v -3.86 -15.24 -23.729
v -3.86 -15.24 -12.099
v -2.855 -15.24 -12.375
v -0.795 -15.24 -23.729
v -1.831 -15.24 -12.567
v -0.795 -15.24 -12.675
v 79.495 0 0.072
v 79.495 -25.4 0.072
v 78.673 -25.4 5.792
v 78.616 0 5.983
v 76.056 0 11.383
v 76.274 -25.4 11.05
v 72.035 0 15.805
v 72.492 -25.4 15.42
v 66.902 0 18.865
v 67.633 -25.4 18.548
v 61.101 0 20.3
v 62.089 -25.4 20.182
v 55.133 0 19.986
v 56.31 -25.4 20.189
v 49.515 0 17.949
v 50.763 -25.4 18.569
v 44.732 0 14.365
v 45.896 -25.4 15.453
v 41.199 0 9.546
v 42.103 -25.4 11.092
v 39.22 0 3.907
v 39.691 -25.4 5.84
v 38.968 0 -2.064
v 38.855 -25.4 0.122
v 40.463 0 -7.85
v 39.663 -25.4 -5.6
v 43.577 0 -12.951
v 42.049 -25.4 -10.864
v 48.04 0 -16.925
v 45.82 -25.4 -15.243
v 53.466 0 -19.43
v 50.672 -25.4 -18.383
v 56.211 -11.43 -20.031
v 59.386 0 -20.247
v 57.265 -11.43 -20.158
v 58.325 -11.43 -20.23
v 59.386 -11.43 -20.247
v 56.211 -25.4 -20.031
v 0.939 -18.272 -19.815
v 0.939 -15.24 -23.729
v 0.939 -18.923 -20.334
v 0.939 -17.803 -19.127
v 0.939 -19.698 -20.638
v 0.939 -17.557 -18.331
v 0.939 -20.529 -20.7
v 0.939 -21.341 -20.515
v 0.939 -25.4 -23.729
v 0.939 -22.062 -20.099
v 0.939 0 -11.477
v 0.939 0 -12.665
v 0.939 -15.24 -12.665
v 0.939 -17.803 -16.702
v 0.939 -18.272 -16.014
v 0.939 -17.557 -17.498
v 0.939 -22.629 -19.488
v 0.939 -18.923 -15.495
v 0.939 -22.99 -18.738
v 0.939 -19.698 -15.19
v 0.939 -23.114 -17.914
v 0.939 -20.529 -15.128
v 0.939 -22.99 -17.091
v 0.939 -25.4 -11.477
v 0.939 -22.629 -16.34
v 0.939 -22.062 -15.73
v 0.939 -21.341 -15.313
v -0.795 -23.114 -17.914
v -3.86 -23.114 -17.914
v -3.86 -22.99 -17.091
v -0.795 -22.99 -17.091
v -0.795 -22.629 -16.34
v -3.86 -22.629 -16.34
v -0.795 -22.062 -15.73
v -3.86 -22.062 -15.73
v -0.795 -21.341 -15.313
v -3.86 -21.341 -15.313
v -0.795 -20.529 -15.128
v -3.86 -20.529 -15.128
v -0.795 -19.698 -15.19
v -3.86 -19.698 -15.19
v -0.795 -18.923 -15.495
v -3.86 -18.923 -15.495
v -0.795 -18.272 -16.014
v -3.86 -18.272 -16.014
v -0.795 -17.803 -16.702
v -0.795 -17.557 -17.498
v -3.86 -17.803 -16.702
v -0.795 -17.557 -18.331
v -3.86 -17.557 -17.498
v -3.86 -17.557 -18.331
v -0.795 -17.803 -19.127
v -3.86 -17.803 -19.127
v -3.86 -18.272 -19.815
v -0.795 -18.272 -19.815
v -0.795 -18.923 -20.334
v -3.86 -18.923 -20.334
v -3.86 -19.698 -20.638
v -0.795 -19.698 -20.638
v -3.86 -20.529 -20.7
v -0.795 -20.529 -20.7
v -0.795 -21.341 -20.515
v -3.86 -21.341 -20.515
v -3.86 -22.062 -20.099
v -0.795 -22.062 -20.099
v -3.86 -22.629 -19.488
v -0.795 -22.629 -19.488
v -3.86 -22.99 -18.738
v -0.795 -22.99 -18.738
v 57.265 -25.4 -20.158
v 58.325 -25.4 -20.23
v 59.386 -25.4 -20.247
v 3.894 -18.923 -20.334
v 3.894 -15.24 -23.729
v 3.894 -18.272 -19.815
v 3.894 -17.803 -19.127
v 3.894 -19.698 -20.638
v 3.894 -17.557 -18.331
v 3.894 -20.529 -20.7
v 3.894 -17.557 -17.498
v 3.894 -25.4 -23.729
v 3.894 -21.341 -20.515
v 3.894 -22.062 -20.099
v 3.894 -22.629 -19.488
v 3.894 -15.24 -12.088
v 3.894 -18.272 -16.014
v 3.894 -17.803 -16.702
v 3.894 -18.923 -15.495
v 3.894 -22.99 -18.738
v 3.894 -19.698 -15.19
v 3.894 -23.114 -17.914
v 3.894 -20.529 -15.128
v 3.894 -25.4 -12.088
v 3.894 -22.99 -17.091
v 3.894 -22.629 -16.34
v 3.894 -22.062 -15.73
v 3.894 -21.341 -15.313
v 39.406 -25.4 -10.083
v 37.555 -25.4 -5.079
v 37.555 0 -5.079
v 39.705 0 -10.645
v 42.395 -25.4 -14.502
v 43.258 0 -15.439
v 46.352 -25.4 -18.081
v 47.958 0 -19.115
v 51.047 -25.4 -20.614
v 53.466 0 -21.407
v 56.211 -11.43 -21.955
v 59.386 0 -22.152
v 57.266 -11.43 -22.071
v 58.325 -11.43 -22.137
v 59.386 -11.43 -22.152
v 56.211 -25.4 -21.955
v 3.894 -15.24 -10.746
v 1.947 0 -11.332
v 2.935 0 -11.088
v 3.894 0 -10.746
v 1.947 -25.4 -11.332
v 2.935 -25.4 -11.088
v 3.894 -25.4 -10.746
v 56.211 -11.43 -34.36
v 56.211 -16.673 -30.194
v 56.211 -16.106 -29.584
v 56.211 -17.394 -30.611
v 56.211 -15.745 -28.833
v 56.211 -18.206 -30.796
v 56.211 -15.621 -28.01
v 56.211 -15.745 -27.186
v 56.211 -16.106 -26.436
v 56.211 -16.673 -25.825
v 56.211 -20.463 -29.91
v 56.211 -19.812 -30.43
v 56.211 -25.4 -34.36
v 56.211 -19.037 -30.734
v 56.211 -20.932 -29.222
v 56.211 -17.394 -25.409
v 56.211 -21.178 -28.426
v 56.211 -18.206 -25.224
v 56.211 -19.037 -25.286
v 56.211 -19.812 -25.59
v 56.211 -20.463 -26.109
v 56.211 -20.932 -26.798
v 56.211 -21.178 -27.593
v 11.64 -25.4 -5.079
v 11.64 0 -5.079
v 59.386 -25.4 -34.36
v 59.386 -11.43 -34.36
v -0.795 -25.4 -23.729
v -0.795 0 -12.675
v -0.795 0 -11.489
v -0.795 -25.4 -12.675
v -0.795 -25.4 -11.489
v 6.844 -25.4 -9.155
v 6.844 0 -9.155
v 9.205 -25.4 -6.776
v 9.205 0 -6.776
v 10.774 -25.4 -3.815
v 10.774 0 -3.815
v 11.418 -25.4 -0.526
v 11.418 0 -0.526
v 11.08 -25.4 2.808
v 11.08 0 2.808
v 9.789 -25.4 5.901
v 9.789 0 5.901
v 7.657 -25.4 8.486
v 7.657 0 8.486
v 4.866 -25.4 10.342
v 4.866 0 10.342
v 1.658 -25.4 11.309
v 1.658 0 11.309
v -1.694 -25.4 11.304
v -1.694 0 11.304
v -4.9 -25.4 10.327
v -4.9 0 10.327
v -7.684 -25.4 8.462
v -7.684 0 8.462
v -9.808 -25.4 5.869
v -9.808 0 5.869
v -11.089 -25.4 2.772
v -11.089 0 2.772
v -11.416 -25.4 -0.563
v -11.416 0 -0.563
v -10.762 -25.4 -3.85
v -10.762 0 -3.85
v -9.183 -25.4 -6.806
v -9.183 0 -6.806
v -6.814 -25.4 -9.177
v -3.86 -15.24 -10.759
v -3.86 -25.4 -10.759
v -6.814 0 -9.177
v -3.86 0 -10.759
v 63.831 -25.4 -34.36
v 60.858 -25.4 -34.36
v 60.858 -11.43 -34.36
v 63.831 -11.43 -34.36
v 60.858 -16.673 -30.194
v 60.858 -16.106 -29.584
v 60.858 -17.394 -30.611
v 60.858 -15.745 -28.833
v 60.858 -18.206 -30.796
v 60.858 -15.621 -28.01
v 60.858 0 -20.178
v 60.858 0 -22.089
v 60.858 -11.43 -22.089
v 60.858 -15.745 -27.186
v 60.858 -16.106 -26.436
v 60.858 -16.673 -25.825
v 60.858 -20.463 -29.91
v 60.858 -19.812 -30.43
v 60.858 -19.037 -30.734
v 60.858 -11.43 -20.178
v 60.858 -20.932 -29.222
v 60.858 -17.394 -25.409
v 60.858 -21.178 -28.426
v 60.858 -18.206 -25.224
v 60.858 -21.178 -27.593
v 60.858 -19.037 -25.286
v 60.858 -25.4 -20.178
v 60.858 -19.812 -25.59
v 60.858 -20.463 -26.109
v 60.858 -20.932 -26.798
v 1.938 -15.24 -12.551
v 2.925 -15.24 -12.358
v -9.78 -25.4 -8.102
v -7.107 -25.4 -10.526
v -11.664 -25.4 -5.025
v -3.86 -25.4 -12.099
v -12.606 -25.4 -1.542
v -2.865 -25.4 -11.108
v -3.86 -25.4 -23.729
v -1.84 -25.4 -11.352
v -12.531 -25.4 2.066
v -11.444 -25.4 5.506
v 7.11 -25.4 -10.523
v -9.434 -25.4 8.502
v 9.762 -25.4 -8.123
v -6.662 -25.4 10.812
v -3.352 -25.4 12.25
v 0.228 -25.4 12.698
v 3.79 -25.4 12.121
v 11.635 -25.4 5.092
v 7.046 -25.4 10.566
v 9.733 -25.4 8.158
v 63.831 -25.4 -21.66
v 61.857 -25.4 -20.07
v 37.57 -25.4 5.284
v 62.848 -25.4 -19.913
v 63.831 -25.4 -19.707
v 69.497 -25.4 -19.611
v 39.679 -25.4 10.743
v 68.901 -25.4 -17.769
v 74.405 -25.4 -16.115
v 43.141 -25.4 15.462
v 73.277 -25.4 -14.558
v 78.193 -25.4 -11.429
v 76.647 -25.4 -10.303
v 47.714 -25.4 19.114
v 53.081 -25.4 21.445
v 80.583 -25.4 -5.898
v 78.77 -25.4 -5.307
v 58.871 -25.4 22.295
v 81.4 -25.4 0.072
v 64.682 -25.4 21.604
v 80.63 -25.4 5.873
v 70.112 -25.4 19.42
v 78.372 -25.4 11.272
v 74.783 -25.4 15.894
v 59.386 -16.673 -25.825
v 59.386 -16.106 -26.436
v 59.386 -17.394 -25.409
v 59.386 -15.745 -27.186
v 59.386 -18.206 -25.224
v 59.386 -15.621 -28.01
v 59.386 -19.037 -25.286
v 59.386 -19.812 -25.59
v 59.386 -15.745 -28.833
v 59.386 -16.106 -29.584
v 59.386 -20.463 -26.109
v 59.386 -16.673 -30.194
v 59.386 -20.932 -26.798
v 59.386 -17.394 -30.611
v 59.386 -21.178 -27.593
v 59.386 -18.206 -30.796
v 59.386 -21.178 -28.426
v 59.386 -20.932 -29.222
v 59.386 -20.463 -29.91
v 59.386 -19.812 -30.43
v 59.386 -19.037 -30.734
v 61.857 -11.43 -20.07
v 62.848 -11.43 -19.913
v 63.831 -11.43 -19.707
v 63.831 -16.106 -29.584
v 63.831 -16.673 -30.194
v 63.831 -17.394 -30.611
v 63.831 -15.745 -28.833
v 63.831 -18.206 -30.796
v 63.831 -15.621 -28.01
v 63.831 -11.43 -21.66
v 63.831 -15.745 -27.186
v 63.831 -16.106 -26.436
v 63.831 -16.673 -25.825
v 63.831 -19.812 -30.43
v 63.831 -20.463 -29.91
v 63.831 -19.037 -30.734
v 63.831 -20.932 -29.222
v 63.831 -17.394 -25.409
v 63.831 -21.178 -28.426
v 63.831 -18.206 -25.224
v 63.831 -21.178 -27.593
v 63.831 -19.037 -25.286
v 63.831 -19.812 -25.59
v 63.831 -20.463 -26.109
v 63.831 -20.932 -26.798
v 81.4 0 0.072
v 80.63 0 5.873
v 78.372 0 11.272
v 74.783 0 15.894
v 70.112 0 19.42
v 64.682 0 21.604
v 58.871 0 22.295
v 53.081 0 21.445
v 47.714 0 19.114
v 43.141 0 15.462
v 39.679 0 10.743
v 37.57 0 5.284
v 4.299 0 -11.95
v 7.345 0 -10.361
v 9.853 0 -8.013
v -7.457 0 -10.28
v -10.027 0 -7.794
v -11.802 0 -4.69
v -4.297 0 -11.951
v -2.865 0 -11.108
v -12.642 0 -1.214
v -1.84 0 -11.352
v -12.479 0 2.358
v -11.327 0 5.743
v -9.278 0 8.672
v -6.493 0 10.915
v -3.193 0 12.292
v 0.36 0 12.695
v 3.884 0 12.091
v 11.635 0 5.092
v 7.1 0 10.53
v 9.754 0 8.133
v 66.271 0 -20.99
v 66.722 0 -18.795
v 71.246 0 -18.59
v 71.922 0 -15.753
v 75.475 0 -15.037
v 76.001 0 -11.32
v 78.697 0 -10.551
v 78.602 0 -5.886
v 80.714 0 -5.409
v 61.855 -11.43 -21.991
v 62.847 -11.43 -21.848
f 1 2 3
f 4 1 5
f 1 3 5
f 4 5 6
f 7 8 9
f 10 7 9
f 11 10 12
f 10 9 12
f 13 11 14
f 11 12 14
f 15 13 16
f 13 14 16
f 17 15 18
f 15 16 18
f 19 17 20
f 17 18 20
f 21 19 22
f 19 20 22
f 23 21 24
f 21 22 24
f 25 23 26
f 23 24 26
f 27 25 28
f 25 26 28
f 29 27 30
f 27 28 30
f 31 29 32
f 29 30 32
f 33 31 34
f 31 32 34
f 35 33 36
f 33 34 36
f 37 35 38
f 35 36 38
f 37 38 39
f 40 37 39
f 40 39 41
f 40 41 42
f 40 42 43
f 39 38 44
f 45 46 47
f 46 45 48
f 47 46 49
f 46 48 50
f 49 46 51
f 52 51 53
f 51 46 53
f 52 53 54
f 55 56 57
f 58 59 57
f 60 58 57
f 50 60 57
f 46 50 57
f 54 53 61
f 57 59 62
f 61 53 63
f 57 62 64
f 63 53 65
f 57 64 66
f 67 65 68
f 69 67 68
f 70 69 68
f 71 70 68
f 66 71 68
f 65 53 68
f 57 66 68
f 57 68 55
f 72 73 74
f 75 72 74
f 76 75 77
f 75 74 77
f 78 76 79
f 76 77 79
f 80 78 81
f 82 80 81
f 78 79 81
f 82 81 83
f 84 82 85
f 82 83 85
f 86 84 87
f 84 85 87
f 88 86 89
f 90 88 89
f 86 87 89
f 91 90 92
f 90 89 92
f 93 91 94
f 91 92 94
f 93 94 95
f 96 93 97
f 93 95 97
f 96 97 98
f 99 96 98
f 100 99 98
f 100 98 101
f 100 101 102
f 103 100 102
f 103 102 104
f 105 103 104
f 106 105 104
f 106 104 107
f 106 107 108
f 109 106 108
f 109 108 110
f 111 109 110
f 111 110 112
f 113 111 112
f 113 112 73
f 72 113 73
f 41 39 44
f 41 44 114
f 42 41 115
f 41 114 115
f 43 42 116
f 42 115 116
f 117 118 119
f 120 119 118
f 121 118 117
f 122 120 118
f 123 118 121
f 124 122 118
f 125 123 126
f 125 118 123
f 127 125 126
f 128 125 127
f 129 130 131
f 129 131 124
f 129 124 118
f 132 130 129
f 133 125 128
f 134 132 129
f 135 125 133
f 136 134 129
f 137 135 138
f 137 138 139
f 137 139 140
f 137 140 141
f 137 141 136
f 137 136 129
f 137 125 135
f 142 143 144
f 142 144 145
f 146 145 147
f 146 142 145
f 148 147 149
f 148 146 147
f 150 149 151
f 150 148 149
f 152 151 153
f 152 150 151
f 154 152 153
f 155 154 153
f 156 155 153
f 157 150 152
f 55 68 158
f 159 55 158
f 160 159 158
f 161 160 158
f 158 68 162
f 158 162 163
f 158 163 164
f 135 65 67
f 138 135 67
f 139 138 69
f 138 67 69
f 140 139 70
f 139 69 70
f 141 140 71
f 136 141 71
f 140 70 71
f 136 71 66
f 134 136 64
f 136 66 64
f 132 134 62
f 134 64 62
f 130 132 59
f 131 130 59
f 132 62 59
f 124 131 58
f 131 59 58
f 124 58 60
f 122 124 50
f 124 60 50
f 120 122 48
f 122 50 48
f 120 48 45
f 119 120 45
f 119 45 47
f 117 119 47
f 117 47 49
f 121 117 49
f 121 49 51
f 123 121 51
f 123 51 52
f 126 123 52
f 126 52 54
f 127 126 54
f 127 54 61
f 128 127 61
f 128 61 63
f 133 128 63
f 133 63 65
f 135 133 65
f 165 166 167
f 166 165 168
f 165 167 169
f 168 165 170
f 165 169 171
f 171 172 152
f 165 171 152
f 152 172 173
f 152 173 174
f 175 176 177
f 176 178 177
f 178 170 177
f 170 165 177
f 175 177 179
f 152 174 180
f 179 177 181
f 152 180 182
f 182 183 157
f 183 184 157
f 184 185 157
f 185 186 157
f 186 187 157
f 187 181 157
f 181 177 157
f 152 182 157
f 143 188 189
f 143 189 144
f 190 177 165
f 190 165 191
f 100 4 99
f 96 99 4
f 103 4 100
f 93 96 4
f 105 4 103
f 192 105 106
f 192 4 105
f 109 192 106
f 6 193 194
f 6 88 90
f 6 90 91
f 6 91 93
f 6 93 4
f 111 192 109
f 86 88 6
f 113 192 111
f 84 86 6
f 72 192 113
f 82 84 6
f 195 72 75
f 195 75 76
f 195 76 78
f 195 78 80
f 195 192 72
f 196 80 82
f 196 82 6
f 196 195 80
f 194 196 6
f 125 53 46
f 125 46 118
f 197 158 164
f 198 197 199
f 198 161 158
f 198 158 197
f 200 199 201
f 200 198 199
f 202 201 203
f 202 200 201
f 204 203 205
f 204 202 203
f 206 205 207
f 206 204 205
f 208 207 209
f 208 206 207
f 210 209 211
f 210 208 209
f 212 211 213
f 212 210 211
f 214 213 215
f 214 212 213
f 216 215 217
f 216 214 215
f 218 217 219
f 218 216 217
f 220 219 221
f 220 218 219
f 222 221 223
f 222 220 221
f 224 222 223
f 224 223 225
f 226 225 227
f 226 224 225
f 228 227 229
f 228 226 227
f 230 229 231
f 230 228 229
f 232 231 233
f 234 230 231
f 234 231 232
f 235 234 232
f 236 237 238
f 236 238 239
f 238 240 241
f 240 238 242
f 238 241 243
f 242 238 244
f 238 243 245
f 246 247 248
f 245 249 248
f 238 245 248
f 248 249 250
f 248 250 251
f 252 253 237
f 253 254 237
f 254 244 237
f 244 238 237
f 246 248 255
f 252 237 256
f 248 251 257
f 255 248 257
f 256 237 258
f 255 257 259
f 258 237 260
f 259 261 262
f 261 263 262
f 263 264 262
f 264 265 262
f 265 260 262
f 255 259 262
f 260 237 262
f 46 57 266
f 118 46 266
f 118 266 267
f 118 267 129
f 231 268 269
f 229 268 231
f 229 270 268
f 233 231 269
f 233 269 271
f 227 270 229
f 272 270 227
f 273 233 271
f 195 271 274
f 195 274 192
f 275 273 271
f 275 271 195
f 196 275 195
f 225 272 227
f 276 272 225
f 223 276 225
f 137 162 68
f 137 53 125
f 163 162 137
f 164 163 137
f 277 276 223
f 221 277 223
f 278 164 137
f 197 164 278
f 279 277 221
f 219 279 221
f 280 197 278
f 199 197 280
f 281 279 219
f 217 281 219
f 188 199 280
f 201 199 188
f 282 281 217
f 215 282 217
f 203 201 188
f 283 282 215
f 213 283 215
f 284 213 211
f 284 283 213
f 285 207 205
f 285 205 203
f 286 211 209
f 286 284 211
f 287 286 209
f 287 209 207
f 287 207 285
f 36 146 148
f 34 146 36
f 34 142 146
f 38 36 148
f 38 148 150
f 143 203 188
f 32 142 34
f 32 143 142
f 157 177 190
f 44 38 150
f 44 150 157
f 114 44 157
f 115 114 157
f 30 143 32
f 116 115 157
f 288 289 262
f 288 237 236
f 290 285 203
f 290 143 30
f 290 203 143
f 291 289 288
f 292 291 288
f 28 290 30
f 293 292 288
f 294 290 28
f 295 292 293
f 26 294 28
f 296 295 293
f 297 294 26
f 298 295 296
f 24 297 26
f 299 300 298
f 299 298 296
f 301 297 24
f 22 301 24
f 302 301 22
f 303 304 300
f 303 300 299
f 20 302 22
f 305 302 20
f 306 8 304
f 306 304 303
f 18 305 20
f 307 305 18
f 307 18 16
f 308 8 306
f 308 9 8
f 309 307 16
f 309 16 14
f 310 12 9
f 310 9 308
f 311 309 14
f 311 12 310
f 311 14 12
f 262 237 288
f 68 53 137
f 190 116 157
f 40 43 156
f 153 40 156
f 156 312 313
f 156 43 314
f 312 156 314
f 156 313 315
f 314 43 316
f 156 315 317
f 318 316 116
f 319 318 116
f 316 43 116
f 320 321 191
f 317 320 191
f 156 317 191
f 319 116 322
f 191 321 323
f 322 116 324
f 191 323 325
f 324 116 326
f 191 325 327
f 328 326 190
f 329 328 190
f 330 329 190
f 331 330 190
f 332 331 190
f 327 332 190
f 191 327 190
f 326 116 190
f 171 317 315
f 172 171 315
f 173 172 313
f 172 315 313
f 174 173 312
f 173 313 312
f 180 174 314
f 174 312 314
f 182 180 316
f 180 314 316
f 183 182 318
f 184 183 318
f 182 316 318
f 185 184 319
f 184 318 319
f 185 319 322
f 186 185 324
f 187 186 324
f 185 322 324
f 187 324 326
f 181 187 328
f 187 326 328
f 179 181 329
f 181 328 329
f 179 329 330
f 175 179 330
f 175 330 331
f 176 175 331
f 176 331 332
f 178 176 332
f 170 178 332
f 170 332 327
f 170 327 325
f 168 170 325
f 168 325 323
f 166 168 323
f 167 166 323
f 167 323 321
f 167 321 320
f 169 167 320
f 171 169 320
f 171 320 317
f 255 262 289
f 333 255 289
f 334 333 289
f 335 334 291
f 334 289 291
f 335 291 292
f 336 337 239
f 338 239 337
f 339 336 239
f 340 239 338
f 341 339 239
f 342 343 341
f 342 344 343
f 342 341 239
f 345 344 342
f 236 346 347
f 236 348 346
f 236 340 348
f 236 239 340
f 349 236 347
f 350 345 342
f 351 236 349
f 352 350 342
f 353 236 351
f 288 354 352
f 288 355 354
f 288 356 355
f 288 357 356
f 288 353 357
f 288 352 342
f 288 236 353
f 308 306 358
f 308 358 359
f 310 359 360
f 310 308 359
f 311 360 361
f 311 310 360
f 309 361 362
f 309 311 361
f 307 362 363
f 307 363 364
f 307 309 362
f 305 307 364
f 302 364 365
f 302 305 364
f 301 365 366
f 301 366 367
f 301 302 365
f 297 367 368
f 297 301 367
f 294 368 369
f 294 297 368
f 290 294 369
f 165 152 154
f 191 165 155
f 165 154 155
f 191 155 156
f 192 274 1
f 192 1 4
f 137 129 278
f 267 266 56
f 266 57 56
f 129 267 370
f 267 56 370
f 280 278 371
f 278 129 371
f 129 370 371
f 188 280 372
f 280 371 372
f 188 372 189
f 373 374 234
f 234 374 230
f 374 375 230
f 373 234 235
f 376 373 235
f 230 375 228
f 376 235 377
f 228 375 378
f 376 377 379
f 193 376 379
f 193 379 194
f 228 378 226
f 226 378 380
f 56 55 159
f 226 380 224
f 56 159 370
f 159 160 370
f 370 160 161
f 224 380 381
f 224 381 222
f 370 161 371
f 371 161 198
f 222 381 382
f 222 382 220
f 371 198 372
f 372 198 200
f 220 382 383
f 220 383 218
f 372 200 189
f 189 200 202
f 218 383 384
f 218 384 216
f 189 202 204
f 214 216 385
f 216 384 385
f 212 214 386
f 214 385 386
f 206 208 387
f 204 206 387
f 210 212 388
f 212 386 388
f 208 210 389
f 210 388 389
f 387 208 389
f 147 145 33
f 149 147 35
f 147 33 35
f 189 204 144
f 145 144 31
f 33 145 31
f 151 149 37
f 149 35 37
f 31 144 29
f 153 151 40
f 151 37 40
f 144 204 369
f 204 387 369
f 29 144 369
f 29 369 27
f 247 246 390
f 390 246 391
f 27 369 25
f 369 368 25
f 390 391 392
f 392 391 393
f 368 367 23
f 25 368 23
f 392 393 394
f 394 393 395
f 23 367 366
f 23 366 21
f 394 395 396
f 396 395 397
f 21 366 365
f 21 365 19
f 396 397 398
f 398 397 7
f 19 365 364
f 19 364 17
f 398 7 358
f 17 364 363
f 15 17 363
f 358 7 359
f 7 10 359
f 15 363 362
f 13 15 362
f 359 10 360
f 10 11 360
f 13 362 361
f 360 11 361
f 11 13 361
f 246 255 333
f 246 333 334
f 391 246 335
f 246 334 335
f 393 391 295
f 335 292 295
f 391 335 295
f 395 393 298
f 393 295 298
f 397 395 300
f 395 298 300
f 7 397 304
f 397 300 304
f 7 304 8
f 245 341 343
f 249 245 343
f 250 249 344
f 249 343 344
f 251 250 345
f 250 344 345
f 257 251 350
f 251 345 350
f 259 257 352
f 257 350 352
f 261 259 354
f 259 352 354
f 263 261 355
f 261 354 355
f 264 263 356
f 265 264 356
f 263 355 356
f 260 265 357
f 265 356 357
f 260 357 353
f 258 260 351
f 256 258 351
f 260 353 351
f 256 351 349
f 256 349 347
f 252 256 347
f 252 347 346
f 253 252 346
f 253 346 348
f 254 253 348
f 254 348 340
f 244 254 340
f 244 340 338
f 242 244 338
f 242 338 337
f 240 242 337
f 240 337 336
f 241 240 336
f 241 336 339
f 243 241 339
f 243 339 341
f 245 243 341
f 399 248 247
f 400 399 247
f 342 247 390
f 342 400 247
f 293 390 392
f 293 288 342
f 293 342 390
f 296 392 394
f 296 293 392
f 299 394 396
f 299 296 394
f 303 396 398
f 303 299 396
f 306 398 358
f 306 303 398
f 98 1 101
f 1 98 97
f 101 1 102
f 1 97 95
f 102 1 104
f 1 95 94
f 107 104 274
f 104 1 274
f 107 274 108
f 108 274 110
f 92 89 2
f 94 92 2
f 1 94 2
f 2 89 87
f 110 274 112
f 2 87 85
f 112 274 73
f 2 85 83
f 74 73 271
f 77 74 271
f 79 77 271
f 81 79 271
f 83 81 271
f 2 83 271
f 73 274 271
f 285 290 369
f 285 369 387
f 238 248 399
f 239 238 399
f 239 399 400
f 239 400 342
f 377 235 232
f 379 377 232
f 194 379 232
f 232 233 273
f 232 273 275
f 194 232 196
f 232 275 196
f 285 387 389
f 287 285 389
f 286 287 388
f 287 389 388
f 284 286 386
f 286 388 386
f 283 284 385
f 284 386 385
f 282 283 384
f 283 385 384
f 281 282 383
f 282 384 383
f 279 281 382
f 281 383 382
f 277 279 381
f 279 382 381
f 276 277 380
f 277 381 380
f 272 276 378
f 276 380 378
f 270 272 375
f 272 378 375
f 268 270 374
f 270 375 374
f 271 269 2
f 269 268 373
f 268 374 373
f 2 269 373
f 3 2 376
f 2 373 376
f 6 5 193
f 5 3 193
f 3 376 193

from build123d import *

# Parameters (mm, degrees)
F0_R      = 12.7
F0_R_2    = 11.43
F1_DEPTH  = 25.4
F3_R      = 20.32
F4_DEPTH  = 25.4
F5_W      = 3.0645749275
F5_H      = 25.4
F6_DEPTH  = 10.16
F8_DEPTH  = 30.226
F9_DEPTH  = 25.4
F10_R     = 2.794
F11_DEPTH = 25.4
F13_W     = 3.175
F13_H     = 35.56
F14_DEPTH = 13.97
F15_R     = 2.794
F16_DEPTH = 25.4
F18_DEPTH = 30.734
F20_DEPTH = 40.64
F22_DEPTH = 25.4


with BuildPart() as f1:
    # F0 (on Front) → F1 (new body)
    with BuildSketch(Plane.XZ):
        Circle(F0_R)
        Circle(F0_R_2, mode=Mode.SUBTRACT)
    extrude(amount=F1_DEPTH)

    # F5 (on offset) → F6 (join)
    with BuildSketch(Plane.XZ.offset(25.4)):
        with Locations((-2.327306883, -11.0291545425)):
            Rectangle(F5_W, F5_H)
        Polygon((3.894138498, 1.6708454575), (0.9391864802, 1.6708454575), (0.9391864802, -23.7291545425), (3.894138498, -23.7291545425), (3.894138498, -11.0291545425), align=None)
    extrude(amount=-F6_DEPTH)

    # F7 (on face) → F8 (cut)
    with BuildSketch(Plane.XZ.offset(25.4)):
        Polygon((-3.8595943467, 6.5400209701), (-3.8595943467, -10.7586445001), (-0.7950194192, -10.7537217399), (0.9391864802, -10.7509360094), (3.894138498, -10.7461893413), (3.894138498, 6.8227690223), align=None)
        Polygon((0.9391864802, -10.7509360094), (-0.7950194192, -10.7537217399), (-0.7950194192, -12.6750914838), (0.9391864802, -12.6652251759), (0.9391864802, -11.3913488558), align=None)
    extrude(amount=-F8_DEPTH, mode=Mode.SUBTRACT)

    # F7 (on face) → F9 (cut)
    with BuildSketch(Plane.XZ.offset(25.4)):
        Polygon((-3.8595943467, 6.5400209701), (-3.8595943467, -10.7586445001), (-0.7950194192, -10.7537217399), (0.9391864802, -10.7509360094), (3.894138498, -10.7461893413), (3.894138498, 6.8227690223), align=None)
        Polygon((0.9391864802, -10.7509360094), (-0.7950194192, -10.7537217399), (-0.7950194192, -12.6750914838), (0.9391864802, -12.6652251759), (0.9391864802, -11.3913488558), align=None)
    extrude(amount=-F9_DEPTH, mode=Mode.SUBTRACT)

    # F10 (on face) → F11 (cut)
    with BuildSketch(Plane(origin=(-3.8595943467, 0, 0), x_dir=(0, -1, 0), z_dir=(-1, 0, 0))):
        with Locations((20.32, -17.914237003)):
            Circle(F10_R)
    extrude(amount=-F11_DEPTH, mode=Mode.SUBTRACT)


with BuildPart() as f4:
    # F3 (on offset) → F4 (new body)
    with BuildSketch(Plane.XZ.offset(25.4)):
        with BuildLine():
            Line((37.5699403561, 5.2842361421), (10.6034887032, 5.0843427817))
            ThreePointArc((10.6034887032, 5.0843427817), (11.5328465432, 2.6263680661), (11.8205691299, 0.0143647333))
            Line((11.8205691299, 0.0143647333), (36.950101903, 0.0449029444))
            ThreePointArc((36.950101903, 0.0449029444), (37.1040026209, 2.6830272873), (37.5699403561, 5.2842361421))
        make_face()
        with BuildLine():
            ThreePointArc((81.4000854922, 0.0719114545), (61.799611578, 22.1414036966), (37.5699403561, 5.2842361421))
            Line((37.5699403561, 5.2842361421), (38.7200076161, 5.2927612092))
            ThreePointArc((38.7200076161, 5.2927612092), (37.3247254516, 0.1119146147), (38.6803581082, -5.079447813))
            Line((38.6803581082, -5.079447813), (37.5553231739, -5.079447813))
            ThreePointArc((37.5553231739, -5.079447813), (61.7684816706, -22.0012605256), (81.4000854922, 0.0719114545))
        make_face()
        with Locations((59.1750854922, 0.0719114545)):
            Circle(F3_R, mode=Mode.SUBTRACT)
        with BuildLine():
            Line((38.7200076161, 5.2927612092), (37.5699403561, 5.2842361421))
            ThreePointArc((37.5699403561, 5.2842361421), (37.1040026209, 2.6830272873), (36.950101903, 0.0449029444))
            ThreePointArc((36.950101903, 0.0449029444), (37.1034933748, -2.5348962497), (37.5553231739, -5.079447813))
            Line((37.5553231739, -5.079447813), (38.6803581082, -5.079447813))
            ThreePointArc((38.6803581082, -5.079447813), (37.3247254516, 0.1119146147), (38.7200076161, 5.2927612092))
        make_face()
        with BuildLine():
            Line((36.950101903, 0.0449029444), (11.8205691299, 0.0143647333))
            ThreePointArc((11.8205691299, 0.0143647333), (11.4383828548, -2.6236056978), (10.4021426077, -5.079447813))
            Line((10.4021426077, -5.079447813), (37.5553231739, -5.079447813))
            ThreePointArc((37.5553231739, -5.079447813), (37.1034933748, -2.5348962497), (36.950101903, 0.0449029444))
        make_face()
    extrude(amount=-F4_DEPTH)


with BuildPart() as f1_1:
    add(f1.part)

    # F12: union F4
    add(f4.part)

    # F13 (on face) → F14 (join)
    with BuildSketch(Plane.XZ.offset(25.4)):
        Polygon((63.8311807601, 1.2001052282), (60.8582296082, 1.2001052282), (60.8582296082, -34.3598947718), (63.8311807601, -34.3598947718), (63.8311807601, -21.6598947718), align=None)
        with Locations((57.7986807601, -16.5798947718)):
            Rectangle(F13_W, F13_H)
    extrude(amount=-F14_DEPTH)

    # F15 (on face) → F16 (cut)
    with BuildSketch(Plane.YZ.offset(63.8311807601)):
        with Locations((-18.415, -28.0098947718)):
            Circle(F15_R)
    extrude(amount=-F16_DEPTH, mode=Mode.SUBTRACT)

    # F17 (on face) → F18 (cut)
    with BuildSketch(Plane.XZ.offset(25.4)):
        with BuildLine():
            ThreePointArc((63.8311807601, -19.7074509431), (58.3136851955, 20.3736451127), (56.2111807601, -20.0307666939))
            Line((56.2111807601, -20.0307666939), (56.2111807601, 1.2001052282))
            Line((56.2111807601, 1.2001052282), (59.3861807601, 1.2001052282))
            Line((59.3861807601, 1.2001052282), (60.8582296082, 1.2001052282))
            Line((60.8582296082, 1.2001052282), (63.8311807601, 1.2001052282))
            Line((63.8311807601, 1.2001052282), (63.8311807601, -19.7074509431))
        make_face()
        with BuildLine():
            Line((56.2111807601, 1.2001052282), (56.2111807601, -20.0307666939))
            ThreePointArc((56.2111807601, -20.0307666939), (57.7944413181, -20.2011302922), (59.3861807601, -20.2469920294))
            Line((59.3861807601, -20.2469920294), (59.3861807601, 1.2001052282))
            Line((59.3861807601, 1.2001052282), (56.2111807601, 1.2001052282))
        make_face()
        with BuildLine():
            ThreePointArc((60.8582296082, -20.1782595543), (62.3534347774, -19.9979788248), (63.8311807601, -19.7074509431))
            Line((63.8311807601, -19.7074509431), (63.8311807601, 1.2001052282))
            Line((63.8311807601, 1.2001052282), (60.8582296082, 1.2001052282))
            Line((60.8582296082, 1.2001052282), (60.8582296082, -20.1782595543))
        make_face()
        with BuildLine():
            ThreePointArc((60.8582296082, -20.1782595543), (60.1228284685, -20.2259747224), (59.3861807601, -20.2469920294))
            Line((59.3861807601, -20.2469920294), (59.3861807601, -22.1520860209))
            Line((59.3861807601, -22.1520860209), (60.8582296082, -22.0892629477))
            Line((60.8582296082, -22.0892629477), (60.8582296082, -20.1782595543))
        make_face()
        with BuildLine():
            Line((59.3861807601, 1.2001052282), (59.3861807601, -20.2469920294))
            ThreePointArc((59.3861807601, -20.2469920294), (60.1228284685, -20.2259747224), (60.8582296082, -20.1782595543))
            Line((60.8582296082, -20.1782595543), (60.8582296082, 1.2001052282))
            Line((60.8582296082, 1.2001052282), (59.3861807601, 1.2001052282))
        make_face()
        Polygon((60.8582296082, -22.0892629477), (59.3861807601, -22.1520860209), (59.3861807601, -22.3753936589), (60.8582296082, -22.3753936589), align=None)
    extrude(amount=-F18_DEPTH, mode=Mode.SUBTRACT)

    # F19 (on face) → F20 (cut)
    with BuildSketch(Plane.XZ.offset(25.4)):
        with BuildLine():
            Line((-3.8612207101, -9.7461815458), (-3.8595943467, -10.7586445001))
            ThreePointArc((-3.8595943467, -10.7586445001), (0.0185050029, -11.5199534125), (3.894138498, -10.7461893413))
            Line((3.894138498, -10.7461893413), (3.894138498, -9.7337237745))
            Line((3.894138498, -9.7337237745), (-3.8612207101, -9.7461815458))
        make_face()
    extrude(amount=-F20_DEPTH, mode=Mode.SUBTRACT)

    # F21 (on face) → F22 (cut)
    with BuildSketch(Plane.XZ.offset(25.4)):
        Polygon((0.9391864802, -11.4767284574), (-0.7950194192, -11.4886898794), (-0.7950194192, -13.0471941084), (0.9391864802, -13.0471941084), align=None)
    extrude(amount=-F22_DEPTH, mode=Mode.SUBTRACT)


solid = f1_1.part
